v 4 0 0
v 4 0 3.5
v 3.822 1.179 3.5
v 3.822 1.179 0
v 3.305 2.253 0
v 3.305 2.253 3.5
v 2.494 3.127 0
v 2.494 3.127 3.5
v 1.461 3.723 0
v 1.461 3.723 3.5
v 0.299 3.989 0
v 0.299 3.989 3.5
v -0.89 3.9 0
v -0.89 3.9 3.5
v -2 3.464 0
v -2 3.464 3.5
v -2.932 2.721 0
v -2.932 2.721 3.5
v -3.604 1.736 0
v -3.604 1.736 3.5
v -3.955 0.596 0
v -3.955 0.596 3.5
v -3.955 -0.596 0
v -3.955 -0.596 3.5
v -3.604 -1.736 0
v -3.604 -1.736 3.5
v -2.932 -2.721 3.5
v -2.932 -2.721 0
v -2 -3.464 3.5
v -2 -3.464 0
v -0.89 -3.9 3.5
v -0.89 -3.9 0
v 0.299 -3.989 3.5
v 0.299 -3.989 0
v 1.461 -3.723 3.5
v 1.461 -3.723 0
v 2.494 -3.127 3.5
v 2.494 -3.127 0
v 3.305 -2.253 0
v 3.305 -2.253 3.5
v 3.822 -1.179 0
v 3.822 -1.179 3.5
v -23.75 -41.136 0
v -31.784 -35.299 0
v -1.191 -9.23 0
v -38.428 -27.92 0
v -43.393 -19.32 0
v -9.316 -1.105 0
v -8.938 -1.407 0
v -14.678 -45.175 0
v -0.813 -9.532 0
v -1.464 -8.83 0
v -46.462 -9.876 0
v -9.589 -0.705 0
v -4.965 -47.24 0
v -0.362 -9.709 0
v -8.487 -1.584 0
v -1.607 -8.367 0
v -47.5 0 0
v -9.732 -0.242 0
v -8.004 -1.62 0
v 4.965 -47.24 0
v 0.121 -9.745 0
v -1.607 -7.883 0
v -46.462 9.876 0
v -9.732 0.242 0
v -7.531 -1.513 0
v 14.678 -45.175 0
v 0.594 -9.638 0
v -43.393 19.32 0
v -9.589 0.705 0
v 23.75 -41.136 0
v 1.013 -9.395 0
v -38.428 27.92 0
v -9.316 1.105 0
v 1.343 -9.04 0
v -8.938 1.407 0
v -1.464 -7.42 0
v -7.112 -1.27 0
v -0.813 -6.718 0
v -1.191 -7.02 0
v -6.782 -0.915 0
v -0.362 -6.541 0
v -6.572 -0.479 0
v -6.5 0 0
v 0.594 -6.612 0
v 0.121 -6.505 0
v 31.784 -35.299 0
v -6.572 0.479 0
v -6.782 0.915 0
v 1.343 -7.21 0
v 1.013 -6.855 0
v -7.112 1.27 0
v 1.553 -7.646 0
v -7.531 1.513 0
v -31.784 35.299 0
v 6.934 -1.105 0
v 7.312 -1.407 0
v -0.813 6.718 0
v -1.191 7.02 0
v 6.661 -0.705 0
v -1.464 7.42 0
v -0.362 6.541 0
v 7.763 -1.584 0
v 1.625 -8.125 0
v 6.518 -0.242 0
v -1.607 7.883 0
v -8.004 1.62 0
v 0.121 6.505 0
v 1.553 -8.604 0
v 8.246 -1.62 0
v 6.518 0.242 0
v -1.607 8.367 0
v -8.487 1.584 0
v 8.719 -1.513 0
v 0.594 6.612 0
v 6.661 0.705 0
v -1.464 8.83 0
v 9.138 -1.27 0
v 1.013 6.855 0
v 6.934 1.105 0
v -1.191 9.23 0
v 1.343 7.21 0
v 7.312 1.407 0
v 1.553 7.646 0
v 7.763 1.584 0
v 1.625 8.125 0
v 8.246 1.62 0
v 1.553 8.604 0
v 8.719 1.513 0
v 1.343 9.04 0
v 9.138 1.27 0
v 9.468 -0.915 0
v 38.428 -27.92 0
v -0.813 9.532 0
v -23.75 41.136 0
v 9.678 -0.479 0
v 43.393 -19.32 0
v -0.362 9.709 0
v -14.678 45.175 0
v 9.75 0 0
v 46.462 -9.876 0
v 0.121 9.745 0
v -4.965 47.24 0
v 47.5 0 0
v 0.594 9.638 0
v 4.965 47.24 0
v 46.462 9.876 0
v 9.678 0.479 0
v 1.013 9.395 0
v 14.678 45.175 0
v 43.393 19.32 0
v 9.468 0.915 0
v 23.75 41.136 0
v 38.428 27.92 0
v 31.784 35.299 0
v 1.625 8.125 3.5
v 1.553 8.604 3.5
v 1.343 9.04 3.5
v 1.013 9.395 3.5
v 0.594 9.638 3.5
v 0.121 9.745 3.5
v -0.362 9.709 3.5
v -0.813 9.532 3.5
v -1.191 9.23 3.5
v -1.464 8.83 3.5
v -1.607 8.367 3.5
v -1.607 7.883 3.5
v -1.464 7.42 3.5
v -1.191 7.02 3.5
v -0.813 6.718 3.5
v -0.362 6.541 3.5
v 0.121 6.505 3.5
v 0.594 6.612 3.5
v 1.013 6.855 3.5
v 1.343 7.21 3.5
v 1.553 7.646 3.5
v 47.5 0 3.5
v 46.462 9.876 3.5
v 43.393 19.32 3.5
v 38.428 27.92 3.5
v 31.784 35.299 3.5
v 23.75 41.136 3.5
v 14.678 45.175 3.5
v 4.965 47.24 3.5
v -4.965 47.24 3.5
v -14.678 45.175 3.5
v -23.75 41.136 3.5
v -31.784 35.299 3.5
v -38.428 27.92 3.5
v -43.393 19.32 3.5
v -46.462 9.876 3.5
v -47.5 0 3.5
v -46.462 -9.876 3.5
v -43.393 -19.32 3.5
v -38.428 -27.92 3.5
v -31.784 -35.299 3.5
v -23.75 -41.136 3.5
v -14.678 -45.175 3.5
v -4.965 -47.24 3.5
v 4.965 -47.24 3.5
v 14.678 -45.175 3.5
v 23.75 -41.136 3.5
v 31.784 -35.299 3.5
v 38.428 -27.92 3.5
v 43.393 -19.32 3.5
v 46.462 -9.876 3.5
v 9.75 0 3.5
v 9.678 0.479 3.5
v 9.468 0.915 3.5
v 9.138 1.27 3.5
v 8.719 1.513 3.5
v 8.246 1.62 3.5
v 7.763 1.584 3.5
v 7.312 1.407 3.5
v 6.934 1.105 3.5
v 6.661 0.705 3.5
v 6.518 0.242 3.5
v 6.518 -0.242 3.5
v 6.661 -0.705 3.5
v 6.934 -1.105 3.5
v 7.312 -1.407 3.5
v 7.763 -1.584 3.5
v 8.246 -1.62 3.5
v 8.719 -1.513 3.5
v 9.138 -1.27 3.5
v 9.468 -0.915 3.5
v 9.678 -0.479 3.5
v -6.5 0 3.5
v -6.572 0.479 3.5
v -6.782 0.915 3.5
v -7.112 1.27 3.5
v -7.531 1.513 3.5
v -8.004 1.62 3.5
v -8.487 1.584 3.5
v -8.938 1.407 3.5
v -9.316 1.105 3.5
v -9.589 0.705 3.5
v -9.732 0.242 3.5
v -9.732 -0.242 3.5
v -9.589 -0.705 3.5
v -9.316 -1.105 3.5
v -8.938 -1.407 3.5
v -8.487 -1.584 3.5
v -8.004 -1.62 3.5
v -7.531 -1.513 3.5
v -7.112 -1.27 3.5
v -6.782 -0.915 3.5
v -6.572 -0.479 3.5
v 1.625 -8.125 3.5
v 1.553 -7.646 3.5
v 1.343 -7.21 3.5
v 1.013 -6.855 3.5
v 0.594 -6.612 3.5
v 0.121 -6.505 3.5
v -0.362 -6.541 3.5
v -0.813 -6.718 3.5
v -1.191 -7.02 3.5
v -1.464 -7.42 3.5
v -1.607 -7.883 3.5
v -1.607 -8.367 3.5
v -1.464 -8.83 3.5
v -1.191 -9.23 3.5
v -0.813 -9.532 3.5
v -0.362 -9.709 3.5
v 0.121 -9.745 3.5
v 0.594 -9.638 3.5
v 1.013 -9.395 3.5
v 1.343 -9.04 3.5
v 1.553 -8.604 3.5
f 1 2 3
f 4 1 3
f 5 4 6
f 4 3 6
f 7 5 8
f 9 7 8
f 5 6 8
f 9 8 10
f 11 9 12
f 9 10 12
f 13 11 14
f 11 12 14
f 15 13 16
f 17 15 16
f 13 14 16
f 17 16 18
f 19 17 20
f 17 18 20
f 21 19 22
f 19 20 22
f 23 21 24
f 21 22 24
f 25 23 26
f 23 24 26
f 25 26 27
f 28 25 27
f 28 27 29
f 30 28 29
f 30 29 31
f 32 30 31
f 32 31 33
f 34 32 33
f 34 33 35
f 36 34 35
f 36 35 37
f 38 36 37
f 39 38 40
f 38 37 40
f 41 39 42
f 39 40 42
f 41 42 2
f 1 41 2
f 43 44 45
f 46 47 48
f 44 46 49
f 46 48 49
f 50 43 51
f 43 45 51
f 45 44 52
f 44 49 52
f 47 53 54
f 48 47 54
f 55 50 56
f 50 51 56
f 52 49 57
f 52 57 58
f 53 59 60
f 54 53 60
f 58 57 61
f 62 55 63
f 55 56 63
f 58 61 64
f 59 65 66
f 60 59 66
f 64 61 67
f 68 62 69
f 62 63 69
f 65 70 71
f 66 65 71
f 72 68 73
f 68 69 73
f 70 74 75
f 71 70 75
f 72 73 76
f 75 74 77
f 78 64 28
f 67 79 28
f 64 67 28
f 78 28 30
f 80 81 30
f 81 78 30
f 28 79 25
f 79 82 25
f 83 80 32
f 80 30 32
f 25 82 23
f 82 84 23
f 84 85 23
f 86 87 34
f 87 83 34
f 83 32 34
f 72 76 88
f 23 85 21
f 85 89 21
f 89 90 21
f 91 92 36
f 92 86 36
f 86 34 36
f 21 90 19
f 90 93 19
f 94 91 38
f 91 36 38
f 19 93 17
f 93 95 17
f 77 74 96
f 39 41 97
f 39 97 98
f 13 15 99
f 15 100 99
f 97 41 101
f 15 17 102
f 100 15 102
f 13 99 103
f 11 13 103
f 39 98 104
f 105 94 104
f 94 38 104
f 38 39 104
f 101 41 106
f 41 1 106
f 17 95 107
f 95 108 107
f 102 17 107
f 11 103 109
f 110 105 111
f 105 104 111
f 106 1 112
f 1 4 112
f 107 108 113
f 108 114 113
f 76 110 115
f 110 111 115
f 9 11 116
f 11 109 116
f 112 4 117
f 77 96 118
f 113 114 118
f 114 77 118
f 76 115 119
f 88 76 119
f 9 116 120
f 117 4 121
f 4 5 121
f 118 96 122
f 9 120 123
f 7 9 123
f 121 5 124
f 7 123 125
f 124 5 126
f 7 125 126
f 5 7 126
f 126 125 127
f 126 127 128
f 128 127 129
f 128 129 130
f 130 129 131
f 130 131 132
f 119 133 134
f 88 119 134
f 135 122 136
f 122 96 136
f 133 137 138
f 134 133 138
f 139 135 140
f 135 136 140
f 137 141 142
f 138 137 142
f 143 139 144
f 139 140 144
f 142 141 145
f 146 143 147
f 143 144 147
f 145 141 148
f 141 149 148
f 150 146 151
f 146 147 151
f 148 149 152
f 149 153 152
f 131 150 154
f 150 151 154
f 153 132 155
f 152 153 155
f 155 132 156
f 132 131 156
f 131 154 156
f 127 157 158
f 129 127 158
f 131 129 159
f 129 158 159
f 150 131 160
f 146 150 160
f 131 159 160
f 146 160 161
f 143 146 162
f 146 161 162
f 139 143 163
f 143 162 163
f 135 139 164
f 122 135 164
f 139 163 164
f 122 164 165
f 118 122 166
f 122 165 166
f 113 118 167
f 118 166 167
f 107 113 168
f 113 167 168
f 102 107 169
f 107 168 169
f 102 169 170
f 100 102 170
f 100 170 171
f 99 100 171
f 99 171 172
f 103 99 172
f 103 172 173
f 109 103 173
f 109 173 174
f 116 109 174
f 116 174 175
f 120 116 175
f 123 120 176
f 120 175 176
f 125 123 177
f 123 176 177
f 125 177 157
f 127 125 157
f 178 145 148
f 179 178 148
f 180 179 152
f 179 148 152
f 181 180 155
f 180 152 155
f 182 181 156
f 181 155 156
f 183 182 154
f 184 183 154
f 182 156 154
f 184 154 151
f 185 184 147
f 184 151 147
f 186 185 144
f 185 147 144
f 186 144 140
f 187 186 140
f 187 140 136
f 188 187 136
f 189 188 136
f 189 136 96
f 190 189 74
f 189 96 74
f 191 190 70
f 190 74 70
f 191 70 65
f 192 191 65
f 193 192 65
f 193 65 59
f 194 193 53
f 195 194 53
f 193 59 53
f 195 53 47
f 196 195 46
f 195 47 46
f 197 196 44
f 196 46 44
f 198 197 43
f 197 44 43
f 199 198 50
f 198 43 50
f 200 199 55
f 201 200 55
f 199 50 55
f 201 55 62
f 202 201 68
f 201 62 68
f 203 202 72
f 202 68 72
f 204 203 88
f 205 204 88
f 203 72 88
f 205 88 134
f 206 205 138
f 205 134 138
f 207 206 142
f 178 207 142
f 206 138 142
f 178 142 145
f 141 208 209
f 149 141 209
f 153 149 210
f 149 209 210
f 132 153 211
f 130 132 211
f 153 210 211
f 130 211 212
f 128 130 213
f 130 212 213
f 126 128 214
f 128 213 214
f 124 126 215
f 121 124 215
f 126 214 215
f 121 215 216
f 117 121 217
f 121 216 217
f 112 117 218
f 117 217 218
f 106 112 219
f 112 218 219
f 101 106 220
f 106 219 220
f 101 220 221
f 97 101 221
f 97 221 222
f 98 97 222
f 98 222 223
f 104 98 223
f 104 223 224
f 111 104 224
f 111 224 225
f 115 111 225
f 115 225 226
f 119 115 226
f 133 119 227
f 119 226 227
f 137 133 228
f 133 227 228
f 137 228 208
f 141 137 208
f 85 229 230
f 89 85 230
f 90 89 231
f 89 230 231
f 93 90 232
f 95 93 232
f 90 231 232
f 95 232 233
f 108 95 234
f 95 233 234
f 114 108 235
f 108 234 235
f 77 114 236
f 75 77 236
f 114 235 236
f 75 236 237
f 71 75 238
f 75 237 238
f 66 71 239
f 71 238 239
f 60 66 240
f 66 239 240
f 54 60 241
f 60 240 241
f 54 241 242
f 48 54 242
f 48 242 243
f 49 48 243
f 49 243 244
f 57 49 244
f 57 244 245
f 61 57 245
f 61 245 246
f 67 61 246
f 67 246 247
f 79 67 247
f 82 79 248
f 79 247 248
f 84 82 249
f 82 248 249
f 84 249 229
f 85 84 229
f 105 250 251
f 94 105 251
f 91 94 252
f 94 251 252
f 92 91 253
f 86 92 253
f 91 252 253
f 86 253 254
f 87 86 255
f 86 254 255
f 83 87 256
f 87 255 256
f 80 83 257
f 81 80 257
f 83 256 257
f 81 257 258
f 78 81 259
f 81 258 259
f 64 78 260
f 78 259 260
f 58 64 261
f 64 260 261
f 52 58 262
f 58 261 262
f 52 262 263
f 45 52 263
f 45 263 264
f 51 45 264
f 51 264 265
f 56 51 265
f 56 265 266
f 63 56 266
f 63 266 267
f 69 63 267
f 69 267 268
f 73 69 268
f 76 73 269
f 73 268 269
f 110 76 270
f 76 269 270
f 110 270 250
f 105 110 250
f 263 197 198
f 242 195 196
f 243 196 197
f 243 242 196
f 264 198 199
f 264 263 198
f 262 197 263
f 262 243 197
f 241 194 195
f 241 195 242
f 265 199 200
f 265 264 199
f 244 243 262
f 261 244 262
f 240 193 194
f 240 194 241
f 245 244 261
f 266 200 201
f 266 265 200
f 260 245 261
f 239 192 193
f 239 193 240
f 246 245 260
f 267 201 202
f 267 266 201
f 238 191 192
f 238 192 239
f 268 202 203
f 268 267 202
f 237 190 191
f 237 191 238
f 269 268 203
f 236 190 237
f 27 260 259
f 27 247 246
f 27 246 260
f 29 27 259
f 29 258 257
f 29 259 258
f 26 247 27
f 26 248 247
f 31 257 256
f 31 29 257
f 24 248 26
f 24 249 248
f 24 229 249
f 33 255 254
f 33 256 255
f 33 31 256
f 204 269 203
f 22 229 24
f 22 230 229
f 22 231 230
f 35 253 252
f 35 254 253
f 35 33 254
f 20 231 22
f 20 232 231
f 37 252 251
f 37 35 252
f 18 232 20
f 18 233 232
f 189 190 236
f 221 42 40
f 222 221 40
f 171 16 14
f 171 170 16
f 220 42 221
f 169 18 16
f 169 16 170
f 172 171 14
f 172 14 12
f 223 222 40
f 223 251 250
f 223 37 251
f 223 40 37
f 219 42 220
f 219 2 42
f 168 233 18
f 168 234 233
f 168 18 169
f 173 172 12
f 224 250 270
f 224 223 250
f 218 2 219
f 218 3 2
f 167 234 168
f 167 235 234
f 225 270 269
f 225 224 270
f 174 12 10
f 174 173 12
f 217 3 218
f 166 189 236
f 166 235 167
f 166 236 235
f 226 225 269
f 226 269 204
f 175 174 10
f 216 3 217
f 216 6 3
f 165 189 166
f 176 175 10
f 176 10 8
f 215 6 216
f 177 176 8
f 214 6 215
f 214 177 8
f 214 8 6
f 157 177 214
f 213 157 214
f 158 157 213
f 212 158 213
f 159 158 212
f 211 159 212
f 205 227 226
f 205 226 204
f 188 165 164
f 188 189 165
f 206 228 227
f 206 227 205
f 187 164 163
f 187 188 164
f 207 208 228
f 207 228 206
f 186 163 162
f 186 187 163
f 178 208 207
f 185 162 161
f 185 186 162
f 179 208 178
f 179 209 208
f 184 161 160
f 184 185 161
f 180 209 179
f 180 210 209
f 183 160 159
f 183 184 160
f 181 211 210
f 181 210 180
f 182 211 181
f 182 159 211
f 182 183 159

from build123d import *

# Parameters (mm, degrees)
F0_R     = 47.5
F1_DEPTH = 3.5
F2_R     = 4
F3_DEPTH = 3.5
F4_R     = 1.625
F5_DEPTH = 3.5


with BuildPart() as f1:
    # F0 (on Top) → F1 (new body)
    with BuildSketch(Plane.XY):
        Circle(F0_R)
    extrude(amount=F1_DEPTH)

    # F2 (on face) → F3 (cut)
    with BuildSketch(Plane.XY.offset(3.5)):
        Circle(F2_R)
    extrude(amount=-F3_DEPTH, mode=Mode.SUBTRACT)

    # F4 (on face) → F5 (cut)
    with BuildSketch(Plane.XY.offset(3.5)):
        with Locations((0, 8.125)):
            Circle(F4_R)
        with Locations((-8.125, 0)):
            Circle(F4_R)
        with Locations((0, -8.125)):
            Circle(F4_R)
        with Locations((8.125, 0)):
            Circle(F4_R)
    extrude(amount=-F5_DEPTH, mode=Mode.SUBTRACT)


solid = f1.part
